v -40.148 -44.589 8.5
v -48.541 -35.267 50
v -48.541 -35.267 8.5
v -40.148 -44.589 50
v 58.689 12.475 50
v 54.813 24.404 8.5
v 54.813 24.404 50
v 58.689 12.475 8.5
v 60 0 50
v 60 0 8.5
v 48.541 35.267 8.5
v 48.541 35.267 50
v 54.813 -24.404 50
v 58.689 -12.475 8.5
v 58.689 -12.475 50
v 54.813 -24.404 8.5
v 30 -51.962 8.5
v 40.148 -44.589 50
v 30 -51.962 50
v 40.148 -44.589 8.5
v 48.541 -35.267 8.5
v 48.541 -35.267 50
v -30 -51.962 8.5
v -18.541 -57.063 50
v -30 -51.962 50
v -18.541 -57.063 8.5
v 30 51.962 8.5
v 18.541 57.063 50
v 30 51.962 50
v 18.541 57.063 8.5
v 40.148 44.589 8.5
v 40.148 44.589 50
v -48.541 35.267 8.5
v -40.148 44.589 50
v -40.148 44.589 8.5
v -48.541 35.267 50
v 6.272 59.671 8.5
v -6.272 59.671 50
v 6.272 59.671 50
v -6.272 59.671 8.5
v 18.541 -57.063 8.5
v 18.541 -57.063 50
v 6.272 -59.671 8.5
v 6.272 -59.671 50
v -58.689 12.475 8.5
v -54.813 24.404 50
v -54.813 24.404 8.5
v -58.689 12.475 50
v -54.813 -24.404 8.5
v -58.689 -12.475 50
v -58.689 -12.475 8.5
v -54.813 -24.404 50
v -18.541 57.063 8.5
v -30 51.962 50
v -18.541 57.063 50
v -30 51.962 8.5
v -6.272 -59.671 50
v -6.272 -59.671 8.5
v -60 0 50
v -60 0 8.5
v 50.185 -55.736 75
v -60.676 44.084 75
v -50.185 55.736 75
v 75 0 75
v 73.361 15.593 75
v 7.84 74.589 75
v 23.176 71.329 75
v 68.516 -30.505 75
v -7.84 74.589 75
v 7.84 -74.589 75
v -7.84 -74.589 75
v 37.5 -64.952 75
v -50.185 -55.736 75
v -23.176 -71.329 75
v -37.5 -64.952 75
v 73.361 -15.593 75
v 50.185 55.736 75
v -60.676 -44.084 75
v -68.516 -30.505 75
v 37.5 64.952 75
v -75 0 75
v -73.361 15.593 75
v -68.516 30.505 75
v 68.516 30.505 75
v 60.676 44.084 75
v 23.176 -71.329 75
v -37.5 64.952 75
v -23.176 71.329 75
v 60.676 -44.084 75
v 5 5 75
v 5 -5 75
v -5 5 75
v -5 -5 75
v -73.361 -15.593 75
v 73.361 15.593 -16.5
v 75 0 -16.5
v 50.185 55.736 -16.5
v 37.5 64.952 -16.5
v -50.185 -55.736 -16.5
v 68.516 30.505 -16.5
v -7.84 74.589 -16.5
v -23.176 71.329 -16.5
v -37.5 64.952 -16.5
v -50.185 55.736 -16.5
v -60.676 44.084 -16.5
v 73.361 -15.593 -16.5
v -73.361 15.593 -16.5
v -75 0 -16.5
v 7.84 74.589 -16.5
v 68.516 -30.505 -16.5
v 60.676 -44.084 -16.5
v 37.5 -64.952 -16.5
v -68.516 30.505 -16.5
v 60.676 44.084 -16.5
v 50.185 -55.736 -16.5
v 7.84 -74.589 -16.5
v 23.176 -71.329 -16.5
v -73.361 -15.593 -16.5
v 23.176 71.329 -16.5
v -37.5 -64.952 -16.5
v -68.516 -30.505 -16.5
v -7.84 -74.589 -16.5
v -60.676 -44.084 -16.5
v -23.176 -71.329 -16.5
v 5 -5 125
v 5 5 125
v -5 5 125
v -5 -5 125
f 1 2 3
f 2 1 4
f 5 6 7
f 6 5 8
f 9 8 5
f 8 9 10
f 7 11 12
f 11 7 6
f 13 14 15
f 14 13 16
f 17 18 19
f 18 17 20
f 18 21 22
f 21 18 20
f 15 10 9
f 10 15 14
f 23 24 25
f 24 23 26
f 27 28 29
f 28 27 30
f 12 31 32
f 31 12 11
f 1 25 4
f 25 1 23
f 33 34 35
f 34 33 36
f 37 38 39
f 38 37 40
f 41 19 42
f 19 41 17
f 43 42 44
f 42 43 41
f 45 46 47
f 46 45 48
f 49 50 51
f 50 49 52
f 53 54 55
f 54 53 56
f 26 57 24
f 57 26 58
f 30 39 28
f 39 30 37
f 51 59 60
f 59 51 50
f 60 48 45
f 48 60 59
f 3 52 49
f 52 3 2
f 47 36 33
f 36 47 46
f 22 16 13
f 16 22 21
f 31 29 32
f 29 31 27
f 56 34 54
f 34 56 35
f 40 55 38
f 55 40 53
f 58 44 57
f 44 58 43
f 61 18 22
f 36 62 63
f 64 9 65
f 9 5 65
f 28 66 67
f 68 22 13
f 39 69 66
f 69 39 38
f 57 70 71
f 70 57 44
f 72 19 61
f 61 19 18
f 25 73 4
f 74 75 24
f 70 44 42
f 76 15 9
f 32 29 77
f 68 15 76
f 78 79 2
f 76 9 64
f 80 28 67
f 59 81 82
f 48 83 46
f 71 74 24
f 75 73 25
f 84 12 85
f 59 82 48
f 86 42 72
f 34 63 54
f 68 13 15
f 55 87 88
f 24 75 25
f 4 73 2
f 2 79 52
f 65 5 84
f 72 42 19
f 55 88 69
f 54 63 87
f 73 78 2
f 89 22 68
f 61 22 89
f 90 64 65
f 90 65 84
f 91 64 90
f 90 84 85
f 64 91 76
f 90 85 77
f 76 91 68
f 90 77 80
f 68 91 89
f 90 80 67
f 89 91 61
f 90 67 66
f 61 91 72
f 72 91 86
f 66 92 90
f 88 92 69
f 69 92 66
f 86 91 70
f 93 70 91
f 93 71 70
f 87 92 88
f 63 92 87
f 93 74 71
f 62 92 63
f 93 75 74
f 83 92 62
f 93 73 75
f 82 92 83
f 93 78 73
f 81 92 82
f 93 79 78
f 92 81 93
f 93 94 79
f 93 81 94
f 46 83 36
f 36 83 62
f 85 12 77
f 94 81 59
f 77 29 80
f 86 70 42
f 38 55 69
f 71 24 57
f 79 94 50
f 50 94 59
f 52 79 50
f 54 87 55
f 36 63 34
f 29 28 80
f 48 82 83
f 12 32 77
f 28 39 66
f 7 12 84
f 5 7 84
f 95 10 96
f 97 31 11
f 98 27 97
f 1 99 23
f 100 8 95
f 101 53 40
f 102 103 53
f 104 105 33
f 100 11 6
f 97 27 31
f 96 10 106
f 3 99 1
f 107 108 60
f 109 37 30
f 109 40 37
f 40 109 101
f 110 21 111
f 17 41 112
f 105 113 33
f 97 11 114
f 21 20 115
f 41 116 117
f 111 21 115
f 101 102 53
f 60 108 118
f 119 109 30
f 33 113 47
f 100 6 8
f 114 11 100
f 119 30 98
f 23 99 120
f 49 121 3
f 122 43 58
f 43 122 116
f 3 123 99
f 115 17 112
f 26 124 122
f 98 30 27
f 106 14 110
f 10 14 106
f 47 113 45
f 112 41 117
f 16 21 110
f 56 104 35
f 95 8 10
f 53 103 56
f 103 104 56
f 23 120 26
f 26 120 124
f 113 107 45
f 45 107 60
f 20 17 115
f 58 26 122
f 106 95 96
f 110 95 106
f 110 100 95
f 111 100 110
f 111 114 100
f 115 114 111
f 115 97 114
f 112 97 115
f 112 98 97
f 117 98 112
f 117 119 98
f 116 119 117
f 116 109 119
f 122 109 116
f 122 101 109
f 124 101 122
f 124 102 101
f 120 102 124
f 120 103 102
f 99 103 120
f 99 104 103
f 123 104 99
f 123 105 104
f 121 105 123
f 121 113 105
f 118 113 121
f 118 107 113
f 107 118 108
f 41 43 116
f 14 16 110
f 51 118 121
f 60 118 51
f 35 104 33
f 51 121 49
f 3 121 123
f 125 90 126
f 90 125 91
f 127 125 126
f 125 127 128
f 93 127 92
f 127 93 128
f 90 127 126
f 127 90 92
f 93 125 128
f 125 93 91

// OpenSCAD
// transmission


module disk(h, d){

cylinder(h, d, d);

translate([0, 0, h])
cylinder(.5 * h, d, d * 1.25);

translate([0, 0, -.33 * h])
cylinder(.5 * h, d * 1.25, d);    
}


//translate([0, 0, 10])
disk(50, 60);
translate([-5, -5, 0])
cube([10, 10, 125]);
